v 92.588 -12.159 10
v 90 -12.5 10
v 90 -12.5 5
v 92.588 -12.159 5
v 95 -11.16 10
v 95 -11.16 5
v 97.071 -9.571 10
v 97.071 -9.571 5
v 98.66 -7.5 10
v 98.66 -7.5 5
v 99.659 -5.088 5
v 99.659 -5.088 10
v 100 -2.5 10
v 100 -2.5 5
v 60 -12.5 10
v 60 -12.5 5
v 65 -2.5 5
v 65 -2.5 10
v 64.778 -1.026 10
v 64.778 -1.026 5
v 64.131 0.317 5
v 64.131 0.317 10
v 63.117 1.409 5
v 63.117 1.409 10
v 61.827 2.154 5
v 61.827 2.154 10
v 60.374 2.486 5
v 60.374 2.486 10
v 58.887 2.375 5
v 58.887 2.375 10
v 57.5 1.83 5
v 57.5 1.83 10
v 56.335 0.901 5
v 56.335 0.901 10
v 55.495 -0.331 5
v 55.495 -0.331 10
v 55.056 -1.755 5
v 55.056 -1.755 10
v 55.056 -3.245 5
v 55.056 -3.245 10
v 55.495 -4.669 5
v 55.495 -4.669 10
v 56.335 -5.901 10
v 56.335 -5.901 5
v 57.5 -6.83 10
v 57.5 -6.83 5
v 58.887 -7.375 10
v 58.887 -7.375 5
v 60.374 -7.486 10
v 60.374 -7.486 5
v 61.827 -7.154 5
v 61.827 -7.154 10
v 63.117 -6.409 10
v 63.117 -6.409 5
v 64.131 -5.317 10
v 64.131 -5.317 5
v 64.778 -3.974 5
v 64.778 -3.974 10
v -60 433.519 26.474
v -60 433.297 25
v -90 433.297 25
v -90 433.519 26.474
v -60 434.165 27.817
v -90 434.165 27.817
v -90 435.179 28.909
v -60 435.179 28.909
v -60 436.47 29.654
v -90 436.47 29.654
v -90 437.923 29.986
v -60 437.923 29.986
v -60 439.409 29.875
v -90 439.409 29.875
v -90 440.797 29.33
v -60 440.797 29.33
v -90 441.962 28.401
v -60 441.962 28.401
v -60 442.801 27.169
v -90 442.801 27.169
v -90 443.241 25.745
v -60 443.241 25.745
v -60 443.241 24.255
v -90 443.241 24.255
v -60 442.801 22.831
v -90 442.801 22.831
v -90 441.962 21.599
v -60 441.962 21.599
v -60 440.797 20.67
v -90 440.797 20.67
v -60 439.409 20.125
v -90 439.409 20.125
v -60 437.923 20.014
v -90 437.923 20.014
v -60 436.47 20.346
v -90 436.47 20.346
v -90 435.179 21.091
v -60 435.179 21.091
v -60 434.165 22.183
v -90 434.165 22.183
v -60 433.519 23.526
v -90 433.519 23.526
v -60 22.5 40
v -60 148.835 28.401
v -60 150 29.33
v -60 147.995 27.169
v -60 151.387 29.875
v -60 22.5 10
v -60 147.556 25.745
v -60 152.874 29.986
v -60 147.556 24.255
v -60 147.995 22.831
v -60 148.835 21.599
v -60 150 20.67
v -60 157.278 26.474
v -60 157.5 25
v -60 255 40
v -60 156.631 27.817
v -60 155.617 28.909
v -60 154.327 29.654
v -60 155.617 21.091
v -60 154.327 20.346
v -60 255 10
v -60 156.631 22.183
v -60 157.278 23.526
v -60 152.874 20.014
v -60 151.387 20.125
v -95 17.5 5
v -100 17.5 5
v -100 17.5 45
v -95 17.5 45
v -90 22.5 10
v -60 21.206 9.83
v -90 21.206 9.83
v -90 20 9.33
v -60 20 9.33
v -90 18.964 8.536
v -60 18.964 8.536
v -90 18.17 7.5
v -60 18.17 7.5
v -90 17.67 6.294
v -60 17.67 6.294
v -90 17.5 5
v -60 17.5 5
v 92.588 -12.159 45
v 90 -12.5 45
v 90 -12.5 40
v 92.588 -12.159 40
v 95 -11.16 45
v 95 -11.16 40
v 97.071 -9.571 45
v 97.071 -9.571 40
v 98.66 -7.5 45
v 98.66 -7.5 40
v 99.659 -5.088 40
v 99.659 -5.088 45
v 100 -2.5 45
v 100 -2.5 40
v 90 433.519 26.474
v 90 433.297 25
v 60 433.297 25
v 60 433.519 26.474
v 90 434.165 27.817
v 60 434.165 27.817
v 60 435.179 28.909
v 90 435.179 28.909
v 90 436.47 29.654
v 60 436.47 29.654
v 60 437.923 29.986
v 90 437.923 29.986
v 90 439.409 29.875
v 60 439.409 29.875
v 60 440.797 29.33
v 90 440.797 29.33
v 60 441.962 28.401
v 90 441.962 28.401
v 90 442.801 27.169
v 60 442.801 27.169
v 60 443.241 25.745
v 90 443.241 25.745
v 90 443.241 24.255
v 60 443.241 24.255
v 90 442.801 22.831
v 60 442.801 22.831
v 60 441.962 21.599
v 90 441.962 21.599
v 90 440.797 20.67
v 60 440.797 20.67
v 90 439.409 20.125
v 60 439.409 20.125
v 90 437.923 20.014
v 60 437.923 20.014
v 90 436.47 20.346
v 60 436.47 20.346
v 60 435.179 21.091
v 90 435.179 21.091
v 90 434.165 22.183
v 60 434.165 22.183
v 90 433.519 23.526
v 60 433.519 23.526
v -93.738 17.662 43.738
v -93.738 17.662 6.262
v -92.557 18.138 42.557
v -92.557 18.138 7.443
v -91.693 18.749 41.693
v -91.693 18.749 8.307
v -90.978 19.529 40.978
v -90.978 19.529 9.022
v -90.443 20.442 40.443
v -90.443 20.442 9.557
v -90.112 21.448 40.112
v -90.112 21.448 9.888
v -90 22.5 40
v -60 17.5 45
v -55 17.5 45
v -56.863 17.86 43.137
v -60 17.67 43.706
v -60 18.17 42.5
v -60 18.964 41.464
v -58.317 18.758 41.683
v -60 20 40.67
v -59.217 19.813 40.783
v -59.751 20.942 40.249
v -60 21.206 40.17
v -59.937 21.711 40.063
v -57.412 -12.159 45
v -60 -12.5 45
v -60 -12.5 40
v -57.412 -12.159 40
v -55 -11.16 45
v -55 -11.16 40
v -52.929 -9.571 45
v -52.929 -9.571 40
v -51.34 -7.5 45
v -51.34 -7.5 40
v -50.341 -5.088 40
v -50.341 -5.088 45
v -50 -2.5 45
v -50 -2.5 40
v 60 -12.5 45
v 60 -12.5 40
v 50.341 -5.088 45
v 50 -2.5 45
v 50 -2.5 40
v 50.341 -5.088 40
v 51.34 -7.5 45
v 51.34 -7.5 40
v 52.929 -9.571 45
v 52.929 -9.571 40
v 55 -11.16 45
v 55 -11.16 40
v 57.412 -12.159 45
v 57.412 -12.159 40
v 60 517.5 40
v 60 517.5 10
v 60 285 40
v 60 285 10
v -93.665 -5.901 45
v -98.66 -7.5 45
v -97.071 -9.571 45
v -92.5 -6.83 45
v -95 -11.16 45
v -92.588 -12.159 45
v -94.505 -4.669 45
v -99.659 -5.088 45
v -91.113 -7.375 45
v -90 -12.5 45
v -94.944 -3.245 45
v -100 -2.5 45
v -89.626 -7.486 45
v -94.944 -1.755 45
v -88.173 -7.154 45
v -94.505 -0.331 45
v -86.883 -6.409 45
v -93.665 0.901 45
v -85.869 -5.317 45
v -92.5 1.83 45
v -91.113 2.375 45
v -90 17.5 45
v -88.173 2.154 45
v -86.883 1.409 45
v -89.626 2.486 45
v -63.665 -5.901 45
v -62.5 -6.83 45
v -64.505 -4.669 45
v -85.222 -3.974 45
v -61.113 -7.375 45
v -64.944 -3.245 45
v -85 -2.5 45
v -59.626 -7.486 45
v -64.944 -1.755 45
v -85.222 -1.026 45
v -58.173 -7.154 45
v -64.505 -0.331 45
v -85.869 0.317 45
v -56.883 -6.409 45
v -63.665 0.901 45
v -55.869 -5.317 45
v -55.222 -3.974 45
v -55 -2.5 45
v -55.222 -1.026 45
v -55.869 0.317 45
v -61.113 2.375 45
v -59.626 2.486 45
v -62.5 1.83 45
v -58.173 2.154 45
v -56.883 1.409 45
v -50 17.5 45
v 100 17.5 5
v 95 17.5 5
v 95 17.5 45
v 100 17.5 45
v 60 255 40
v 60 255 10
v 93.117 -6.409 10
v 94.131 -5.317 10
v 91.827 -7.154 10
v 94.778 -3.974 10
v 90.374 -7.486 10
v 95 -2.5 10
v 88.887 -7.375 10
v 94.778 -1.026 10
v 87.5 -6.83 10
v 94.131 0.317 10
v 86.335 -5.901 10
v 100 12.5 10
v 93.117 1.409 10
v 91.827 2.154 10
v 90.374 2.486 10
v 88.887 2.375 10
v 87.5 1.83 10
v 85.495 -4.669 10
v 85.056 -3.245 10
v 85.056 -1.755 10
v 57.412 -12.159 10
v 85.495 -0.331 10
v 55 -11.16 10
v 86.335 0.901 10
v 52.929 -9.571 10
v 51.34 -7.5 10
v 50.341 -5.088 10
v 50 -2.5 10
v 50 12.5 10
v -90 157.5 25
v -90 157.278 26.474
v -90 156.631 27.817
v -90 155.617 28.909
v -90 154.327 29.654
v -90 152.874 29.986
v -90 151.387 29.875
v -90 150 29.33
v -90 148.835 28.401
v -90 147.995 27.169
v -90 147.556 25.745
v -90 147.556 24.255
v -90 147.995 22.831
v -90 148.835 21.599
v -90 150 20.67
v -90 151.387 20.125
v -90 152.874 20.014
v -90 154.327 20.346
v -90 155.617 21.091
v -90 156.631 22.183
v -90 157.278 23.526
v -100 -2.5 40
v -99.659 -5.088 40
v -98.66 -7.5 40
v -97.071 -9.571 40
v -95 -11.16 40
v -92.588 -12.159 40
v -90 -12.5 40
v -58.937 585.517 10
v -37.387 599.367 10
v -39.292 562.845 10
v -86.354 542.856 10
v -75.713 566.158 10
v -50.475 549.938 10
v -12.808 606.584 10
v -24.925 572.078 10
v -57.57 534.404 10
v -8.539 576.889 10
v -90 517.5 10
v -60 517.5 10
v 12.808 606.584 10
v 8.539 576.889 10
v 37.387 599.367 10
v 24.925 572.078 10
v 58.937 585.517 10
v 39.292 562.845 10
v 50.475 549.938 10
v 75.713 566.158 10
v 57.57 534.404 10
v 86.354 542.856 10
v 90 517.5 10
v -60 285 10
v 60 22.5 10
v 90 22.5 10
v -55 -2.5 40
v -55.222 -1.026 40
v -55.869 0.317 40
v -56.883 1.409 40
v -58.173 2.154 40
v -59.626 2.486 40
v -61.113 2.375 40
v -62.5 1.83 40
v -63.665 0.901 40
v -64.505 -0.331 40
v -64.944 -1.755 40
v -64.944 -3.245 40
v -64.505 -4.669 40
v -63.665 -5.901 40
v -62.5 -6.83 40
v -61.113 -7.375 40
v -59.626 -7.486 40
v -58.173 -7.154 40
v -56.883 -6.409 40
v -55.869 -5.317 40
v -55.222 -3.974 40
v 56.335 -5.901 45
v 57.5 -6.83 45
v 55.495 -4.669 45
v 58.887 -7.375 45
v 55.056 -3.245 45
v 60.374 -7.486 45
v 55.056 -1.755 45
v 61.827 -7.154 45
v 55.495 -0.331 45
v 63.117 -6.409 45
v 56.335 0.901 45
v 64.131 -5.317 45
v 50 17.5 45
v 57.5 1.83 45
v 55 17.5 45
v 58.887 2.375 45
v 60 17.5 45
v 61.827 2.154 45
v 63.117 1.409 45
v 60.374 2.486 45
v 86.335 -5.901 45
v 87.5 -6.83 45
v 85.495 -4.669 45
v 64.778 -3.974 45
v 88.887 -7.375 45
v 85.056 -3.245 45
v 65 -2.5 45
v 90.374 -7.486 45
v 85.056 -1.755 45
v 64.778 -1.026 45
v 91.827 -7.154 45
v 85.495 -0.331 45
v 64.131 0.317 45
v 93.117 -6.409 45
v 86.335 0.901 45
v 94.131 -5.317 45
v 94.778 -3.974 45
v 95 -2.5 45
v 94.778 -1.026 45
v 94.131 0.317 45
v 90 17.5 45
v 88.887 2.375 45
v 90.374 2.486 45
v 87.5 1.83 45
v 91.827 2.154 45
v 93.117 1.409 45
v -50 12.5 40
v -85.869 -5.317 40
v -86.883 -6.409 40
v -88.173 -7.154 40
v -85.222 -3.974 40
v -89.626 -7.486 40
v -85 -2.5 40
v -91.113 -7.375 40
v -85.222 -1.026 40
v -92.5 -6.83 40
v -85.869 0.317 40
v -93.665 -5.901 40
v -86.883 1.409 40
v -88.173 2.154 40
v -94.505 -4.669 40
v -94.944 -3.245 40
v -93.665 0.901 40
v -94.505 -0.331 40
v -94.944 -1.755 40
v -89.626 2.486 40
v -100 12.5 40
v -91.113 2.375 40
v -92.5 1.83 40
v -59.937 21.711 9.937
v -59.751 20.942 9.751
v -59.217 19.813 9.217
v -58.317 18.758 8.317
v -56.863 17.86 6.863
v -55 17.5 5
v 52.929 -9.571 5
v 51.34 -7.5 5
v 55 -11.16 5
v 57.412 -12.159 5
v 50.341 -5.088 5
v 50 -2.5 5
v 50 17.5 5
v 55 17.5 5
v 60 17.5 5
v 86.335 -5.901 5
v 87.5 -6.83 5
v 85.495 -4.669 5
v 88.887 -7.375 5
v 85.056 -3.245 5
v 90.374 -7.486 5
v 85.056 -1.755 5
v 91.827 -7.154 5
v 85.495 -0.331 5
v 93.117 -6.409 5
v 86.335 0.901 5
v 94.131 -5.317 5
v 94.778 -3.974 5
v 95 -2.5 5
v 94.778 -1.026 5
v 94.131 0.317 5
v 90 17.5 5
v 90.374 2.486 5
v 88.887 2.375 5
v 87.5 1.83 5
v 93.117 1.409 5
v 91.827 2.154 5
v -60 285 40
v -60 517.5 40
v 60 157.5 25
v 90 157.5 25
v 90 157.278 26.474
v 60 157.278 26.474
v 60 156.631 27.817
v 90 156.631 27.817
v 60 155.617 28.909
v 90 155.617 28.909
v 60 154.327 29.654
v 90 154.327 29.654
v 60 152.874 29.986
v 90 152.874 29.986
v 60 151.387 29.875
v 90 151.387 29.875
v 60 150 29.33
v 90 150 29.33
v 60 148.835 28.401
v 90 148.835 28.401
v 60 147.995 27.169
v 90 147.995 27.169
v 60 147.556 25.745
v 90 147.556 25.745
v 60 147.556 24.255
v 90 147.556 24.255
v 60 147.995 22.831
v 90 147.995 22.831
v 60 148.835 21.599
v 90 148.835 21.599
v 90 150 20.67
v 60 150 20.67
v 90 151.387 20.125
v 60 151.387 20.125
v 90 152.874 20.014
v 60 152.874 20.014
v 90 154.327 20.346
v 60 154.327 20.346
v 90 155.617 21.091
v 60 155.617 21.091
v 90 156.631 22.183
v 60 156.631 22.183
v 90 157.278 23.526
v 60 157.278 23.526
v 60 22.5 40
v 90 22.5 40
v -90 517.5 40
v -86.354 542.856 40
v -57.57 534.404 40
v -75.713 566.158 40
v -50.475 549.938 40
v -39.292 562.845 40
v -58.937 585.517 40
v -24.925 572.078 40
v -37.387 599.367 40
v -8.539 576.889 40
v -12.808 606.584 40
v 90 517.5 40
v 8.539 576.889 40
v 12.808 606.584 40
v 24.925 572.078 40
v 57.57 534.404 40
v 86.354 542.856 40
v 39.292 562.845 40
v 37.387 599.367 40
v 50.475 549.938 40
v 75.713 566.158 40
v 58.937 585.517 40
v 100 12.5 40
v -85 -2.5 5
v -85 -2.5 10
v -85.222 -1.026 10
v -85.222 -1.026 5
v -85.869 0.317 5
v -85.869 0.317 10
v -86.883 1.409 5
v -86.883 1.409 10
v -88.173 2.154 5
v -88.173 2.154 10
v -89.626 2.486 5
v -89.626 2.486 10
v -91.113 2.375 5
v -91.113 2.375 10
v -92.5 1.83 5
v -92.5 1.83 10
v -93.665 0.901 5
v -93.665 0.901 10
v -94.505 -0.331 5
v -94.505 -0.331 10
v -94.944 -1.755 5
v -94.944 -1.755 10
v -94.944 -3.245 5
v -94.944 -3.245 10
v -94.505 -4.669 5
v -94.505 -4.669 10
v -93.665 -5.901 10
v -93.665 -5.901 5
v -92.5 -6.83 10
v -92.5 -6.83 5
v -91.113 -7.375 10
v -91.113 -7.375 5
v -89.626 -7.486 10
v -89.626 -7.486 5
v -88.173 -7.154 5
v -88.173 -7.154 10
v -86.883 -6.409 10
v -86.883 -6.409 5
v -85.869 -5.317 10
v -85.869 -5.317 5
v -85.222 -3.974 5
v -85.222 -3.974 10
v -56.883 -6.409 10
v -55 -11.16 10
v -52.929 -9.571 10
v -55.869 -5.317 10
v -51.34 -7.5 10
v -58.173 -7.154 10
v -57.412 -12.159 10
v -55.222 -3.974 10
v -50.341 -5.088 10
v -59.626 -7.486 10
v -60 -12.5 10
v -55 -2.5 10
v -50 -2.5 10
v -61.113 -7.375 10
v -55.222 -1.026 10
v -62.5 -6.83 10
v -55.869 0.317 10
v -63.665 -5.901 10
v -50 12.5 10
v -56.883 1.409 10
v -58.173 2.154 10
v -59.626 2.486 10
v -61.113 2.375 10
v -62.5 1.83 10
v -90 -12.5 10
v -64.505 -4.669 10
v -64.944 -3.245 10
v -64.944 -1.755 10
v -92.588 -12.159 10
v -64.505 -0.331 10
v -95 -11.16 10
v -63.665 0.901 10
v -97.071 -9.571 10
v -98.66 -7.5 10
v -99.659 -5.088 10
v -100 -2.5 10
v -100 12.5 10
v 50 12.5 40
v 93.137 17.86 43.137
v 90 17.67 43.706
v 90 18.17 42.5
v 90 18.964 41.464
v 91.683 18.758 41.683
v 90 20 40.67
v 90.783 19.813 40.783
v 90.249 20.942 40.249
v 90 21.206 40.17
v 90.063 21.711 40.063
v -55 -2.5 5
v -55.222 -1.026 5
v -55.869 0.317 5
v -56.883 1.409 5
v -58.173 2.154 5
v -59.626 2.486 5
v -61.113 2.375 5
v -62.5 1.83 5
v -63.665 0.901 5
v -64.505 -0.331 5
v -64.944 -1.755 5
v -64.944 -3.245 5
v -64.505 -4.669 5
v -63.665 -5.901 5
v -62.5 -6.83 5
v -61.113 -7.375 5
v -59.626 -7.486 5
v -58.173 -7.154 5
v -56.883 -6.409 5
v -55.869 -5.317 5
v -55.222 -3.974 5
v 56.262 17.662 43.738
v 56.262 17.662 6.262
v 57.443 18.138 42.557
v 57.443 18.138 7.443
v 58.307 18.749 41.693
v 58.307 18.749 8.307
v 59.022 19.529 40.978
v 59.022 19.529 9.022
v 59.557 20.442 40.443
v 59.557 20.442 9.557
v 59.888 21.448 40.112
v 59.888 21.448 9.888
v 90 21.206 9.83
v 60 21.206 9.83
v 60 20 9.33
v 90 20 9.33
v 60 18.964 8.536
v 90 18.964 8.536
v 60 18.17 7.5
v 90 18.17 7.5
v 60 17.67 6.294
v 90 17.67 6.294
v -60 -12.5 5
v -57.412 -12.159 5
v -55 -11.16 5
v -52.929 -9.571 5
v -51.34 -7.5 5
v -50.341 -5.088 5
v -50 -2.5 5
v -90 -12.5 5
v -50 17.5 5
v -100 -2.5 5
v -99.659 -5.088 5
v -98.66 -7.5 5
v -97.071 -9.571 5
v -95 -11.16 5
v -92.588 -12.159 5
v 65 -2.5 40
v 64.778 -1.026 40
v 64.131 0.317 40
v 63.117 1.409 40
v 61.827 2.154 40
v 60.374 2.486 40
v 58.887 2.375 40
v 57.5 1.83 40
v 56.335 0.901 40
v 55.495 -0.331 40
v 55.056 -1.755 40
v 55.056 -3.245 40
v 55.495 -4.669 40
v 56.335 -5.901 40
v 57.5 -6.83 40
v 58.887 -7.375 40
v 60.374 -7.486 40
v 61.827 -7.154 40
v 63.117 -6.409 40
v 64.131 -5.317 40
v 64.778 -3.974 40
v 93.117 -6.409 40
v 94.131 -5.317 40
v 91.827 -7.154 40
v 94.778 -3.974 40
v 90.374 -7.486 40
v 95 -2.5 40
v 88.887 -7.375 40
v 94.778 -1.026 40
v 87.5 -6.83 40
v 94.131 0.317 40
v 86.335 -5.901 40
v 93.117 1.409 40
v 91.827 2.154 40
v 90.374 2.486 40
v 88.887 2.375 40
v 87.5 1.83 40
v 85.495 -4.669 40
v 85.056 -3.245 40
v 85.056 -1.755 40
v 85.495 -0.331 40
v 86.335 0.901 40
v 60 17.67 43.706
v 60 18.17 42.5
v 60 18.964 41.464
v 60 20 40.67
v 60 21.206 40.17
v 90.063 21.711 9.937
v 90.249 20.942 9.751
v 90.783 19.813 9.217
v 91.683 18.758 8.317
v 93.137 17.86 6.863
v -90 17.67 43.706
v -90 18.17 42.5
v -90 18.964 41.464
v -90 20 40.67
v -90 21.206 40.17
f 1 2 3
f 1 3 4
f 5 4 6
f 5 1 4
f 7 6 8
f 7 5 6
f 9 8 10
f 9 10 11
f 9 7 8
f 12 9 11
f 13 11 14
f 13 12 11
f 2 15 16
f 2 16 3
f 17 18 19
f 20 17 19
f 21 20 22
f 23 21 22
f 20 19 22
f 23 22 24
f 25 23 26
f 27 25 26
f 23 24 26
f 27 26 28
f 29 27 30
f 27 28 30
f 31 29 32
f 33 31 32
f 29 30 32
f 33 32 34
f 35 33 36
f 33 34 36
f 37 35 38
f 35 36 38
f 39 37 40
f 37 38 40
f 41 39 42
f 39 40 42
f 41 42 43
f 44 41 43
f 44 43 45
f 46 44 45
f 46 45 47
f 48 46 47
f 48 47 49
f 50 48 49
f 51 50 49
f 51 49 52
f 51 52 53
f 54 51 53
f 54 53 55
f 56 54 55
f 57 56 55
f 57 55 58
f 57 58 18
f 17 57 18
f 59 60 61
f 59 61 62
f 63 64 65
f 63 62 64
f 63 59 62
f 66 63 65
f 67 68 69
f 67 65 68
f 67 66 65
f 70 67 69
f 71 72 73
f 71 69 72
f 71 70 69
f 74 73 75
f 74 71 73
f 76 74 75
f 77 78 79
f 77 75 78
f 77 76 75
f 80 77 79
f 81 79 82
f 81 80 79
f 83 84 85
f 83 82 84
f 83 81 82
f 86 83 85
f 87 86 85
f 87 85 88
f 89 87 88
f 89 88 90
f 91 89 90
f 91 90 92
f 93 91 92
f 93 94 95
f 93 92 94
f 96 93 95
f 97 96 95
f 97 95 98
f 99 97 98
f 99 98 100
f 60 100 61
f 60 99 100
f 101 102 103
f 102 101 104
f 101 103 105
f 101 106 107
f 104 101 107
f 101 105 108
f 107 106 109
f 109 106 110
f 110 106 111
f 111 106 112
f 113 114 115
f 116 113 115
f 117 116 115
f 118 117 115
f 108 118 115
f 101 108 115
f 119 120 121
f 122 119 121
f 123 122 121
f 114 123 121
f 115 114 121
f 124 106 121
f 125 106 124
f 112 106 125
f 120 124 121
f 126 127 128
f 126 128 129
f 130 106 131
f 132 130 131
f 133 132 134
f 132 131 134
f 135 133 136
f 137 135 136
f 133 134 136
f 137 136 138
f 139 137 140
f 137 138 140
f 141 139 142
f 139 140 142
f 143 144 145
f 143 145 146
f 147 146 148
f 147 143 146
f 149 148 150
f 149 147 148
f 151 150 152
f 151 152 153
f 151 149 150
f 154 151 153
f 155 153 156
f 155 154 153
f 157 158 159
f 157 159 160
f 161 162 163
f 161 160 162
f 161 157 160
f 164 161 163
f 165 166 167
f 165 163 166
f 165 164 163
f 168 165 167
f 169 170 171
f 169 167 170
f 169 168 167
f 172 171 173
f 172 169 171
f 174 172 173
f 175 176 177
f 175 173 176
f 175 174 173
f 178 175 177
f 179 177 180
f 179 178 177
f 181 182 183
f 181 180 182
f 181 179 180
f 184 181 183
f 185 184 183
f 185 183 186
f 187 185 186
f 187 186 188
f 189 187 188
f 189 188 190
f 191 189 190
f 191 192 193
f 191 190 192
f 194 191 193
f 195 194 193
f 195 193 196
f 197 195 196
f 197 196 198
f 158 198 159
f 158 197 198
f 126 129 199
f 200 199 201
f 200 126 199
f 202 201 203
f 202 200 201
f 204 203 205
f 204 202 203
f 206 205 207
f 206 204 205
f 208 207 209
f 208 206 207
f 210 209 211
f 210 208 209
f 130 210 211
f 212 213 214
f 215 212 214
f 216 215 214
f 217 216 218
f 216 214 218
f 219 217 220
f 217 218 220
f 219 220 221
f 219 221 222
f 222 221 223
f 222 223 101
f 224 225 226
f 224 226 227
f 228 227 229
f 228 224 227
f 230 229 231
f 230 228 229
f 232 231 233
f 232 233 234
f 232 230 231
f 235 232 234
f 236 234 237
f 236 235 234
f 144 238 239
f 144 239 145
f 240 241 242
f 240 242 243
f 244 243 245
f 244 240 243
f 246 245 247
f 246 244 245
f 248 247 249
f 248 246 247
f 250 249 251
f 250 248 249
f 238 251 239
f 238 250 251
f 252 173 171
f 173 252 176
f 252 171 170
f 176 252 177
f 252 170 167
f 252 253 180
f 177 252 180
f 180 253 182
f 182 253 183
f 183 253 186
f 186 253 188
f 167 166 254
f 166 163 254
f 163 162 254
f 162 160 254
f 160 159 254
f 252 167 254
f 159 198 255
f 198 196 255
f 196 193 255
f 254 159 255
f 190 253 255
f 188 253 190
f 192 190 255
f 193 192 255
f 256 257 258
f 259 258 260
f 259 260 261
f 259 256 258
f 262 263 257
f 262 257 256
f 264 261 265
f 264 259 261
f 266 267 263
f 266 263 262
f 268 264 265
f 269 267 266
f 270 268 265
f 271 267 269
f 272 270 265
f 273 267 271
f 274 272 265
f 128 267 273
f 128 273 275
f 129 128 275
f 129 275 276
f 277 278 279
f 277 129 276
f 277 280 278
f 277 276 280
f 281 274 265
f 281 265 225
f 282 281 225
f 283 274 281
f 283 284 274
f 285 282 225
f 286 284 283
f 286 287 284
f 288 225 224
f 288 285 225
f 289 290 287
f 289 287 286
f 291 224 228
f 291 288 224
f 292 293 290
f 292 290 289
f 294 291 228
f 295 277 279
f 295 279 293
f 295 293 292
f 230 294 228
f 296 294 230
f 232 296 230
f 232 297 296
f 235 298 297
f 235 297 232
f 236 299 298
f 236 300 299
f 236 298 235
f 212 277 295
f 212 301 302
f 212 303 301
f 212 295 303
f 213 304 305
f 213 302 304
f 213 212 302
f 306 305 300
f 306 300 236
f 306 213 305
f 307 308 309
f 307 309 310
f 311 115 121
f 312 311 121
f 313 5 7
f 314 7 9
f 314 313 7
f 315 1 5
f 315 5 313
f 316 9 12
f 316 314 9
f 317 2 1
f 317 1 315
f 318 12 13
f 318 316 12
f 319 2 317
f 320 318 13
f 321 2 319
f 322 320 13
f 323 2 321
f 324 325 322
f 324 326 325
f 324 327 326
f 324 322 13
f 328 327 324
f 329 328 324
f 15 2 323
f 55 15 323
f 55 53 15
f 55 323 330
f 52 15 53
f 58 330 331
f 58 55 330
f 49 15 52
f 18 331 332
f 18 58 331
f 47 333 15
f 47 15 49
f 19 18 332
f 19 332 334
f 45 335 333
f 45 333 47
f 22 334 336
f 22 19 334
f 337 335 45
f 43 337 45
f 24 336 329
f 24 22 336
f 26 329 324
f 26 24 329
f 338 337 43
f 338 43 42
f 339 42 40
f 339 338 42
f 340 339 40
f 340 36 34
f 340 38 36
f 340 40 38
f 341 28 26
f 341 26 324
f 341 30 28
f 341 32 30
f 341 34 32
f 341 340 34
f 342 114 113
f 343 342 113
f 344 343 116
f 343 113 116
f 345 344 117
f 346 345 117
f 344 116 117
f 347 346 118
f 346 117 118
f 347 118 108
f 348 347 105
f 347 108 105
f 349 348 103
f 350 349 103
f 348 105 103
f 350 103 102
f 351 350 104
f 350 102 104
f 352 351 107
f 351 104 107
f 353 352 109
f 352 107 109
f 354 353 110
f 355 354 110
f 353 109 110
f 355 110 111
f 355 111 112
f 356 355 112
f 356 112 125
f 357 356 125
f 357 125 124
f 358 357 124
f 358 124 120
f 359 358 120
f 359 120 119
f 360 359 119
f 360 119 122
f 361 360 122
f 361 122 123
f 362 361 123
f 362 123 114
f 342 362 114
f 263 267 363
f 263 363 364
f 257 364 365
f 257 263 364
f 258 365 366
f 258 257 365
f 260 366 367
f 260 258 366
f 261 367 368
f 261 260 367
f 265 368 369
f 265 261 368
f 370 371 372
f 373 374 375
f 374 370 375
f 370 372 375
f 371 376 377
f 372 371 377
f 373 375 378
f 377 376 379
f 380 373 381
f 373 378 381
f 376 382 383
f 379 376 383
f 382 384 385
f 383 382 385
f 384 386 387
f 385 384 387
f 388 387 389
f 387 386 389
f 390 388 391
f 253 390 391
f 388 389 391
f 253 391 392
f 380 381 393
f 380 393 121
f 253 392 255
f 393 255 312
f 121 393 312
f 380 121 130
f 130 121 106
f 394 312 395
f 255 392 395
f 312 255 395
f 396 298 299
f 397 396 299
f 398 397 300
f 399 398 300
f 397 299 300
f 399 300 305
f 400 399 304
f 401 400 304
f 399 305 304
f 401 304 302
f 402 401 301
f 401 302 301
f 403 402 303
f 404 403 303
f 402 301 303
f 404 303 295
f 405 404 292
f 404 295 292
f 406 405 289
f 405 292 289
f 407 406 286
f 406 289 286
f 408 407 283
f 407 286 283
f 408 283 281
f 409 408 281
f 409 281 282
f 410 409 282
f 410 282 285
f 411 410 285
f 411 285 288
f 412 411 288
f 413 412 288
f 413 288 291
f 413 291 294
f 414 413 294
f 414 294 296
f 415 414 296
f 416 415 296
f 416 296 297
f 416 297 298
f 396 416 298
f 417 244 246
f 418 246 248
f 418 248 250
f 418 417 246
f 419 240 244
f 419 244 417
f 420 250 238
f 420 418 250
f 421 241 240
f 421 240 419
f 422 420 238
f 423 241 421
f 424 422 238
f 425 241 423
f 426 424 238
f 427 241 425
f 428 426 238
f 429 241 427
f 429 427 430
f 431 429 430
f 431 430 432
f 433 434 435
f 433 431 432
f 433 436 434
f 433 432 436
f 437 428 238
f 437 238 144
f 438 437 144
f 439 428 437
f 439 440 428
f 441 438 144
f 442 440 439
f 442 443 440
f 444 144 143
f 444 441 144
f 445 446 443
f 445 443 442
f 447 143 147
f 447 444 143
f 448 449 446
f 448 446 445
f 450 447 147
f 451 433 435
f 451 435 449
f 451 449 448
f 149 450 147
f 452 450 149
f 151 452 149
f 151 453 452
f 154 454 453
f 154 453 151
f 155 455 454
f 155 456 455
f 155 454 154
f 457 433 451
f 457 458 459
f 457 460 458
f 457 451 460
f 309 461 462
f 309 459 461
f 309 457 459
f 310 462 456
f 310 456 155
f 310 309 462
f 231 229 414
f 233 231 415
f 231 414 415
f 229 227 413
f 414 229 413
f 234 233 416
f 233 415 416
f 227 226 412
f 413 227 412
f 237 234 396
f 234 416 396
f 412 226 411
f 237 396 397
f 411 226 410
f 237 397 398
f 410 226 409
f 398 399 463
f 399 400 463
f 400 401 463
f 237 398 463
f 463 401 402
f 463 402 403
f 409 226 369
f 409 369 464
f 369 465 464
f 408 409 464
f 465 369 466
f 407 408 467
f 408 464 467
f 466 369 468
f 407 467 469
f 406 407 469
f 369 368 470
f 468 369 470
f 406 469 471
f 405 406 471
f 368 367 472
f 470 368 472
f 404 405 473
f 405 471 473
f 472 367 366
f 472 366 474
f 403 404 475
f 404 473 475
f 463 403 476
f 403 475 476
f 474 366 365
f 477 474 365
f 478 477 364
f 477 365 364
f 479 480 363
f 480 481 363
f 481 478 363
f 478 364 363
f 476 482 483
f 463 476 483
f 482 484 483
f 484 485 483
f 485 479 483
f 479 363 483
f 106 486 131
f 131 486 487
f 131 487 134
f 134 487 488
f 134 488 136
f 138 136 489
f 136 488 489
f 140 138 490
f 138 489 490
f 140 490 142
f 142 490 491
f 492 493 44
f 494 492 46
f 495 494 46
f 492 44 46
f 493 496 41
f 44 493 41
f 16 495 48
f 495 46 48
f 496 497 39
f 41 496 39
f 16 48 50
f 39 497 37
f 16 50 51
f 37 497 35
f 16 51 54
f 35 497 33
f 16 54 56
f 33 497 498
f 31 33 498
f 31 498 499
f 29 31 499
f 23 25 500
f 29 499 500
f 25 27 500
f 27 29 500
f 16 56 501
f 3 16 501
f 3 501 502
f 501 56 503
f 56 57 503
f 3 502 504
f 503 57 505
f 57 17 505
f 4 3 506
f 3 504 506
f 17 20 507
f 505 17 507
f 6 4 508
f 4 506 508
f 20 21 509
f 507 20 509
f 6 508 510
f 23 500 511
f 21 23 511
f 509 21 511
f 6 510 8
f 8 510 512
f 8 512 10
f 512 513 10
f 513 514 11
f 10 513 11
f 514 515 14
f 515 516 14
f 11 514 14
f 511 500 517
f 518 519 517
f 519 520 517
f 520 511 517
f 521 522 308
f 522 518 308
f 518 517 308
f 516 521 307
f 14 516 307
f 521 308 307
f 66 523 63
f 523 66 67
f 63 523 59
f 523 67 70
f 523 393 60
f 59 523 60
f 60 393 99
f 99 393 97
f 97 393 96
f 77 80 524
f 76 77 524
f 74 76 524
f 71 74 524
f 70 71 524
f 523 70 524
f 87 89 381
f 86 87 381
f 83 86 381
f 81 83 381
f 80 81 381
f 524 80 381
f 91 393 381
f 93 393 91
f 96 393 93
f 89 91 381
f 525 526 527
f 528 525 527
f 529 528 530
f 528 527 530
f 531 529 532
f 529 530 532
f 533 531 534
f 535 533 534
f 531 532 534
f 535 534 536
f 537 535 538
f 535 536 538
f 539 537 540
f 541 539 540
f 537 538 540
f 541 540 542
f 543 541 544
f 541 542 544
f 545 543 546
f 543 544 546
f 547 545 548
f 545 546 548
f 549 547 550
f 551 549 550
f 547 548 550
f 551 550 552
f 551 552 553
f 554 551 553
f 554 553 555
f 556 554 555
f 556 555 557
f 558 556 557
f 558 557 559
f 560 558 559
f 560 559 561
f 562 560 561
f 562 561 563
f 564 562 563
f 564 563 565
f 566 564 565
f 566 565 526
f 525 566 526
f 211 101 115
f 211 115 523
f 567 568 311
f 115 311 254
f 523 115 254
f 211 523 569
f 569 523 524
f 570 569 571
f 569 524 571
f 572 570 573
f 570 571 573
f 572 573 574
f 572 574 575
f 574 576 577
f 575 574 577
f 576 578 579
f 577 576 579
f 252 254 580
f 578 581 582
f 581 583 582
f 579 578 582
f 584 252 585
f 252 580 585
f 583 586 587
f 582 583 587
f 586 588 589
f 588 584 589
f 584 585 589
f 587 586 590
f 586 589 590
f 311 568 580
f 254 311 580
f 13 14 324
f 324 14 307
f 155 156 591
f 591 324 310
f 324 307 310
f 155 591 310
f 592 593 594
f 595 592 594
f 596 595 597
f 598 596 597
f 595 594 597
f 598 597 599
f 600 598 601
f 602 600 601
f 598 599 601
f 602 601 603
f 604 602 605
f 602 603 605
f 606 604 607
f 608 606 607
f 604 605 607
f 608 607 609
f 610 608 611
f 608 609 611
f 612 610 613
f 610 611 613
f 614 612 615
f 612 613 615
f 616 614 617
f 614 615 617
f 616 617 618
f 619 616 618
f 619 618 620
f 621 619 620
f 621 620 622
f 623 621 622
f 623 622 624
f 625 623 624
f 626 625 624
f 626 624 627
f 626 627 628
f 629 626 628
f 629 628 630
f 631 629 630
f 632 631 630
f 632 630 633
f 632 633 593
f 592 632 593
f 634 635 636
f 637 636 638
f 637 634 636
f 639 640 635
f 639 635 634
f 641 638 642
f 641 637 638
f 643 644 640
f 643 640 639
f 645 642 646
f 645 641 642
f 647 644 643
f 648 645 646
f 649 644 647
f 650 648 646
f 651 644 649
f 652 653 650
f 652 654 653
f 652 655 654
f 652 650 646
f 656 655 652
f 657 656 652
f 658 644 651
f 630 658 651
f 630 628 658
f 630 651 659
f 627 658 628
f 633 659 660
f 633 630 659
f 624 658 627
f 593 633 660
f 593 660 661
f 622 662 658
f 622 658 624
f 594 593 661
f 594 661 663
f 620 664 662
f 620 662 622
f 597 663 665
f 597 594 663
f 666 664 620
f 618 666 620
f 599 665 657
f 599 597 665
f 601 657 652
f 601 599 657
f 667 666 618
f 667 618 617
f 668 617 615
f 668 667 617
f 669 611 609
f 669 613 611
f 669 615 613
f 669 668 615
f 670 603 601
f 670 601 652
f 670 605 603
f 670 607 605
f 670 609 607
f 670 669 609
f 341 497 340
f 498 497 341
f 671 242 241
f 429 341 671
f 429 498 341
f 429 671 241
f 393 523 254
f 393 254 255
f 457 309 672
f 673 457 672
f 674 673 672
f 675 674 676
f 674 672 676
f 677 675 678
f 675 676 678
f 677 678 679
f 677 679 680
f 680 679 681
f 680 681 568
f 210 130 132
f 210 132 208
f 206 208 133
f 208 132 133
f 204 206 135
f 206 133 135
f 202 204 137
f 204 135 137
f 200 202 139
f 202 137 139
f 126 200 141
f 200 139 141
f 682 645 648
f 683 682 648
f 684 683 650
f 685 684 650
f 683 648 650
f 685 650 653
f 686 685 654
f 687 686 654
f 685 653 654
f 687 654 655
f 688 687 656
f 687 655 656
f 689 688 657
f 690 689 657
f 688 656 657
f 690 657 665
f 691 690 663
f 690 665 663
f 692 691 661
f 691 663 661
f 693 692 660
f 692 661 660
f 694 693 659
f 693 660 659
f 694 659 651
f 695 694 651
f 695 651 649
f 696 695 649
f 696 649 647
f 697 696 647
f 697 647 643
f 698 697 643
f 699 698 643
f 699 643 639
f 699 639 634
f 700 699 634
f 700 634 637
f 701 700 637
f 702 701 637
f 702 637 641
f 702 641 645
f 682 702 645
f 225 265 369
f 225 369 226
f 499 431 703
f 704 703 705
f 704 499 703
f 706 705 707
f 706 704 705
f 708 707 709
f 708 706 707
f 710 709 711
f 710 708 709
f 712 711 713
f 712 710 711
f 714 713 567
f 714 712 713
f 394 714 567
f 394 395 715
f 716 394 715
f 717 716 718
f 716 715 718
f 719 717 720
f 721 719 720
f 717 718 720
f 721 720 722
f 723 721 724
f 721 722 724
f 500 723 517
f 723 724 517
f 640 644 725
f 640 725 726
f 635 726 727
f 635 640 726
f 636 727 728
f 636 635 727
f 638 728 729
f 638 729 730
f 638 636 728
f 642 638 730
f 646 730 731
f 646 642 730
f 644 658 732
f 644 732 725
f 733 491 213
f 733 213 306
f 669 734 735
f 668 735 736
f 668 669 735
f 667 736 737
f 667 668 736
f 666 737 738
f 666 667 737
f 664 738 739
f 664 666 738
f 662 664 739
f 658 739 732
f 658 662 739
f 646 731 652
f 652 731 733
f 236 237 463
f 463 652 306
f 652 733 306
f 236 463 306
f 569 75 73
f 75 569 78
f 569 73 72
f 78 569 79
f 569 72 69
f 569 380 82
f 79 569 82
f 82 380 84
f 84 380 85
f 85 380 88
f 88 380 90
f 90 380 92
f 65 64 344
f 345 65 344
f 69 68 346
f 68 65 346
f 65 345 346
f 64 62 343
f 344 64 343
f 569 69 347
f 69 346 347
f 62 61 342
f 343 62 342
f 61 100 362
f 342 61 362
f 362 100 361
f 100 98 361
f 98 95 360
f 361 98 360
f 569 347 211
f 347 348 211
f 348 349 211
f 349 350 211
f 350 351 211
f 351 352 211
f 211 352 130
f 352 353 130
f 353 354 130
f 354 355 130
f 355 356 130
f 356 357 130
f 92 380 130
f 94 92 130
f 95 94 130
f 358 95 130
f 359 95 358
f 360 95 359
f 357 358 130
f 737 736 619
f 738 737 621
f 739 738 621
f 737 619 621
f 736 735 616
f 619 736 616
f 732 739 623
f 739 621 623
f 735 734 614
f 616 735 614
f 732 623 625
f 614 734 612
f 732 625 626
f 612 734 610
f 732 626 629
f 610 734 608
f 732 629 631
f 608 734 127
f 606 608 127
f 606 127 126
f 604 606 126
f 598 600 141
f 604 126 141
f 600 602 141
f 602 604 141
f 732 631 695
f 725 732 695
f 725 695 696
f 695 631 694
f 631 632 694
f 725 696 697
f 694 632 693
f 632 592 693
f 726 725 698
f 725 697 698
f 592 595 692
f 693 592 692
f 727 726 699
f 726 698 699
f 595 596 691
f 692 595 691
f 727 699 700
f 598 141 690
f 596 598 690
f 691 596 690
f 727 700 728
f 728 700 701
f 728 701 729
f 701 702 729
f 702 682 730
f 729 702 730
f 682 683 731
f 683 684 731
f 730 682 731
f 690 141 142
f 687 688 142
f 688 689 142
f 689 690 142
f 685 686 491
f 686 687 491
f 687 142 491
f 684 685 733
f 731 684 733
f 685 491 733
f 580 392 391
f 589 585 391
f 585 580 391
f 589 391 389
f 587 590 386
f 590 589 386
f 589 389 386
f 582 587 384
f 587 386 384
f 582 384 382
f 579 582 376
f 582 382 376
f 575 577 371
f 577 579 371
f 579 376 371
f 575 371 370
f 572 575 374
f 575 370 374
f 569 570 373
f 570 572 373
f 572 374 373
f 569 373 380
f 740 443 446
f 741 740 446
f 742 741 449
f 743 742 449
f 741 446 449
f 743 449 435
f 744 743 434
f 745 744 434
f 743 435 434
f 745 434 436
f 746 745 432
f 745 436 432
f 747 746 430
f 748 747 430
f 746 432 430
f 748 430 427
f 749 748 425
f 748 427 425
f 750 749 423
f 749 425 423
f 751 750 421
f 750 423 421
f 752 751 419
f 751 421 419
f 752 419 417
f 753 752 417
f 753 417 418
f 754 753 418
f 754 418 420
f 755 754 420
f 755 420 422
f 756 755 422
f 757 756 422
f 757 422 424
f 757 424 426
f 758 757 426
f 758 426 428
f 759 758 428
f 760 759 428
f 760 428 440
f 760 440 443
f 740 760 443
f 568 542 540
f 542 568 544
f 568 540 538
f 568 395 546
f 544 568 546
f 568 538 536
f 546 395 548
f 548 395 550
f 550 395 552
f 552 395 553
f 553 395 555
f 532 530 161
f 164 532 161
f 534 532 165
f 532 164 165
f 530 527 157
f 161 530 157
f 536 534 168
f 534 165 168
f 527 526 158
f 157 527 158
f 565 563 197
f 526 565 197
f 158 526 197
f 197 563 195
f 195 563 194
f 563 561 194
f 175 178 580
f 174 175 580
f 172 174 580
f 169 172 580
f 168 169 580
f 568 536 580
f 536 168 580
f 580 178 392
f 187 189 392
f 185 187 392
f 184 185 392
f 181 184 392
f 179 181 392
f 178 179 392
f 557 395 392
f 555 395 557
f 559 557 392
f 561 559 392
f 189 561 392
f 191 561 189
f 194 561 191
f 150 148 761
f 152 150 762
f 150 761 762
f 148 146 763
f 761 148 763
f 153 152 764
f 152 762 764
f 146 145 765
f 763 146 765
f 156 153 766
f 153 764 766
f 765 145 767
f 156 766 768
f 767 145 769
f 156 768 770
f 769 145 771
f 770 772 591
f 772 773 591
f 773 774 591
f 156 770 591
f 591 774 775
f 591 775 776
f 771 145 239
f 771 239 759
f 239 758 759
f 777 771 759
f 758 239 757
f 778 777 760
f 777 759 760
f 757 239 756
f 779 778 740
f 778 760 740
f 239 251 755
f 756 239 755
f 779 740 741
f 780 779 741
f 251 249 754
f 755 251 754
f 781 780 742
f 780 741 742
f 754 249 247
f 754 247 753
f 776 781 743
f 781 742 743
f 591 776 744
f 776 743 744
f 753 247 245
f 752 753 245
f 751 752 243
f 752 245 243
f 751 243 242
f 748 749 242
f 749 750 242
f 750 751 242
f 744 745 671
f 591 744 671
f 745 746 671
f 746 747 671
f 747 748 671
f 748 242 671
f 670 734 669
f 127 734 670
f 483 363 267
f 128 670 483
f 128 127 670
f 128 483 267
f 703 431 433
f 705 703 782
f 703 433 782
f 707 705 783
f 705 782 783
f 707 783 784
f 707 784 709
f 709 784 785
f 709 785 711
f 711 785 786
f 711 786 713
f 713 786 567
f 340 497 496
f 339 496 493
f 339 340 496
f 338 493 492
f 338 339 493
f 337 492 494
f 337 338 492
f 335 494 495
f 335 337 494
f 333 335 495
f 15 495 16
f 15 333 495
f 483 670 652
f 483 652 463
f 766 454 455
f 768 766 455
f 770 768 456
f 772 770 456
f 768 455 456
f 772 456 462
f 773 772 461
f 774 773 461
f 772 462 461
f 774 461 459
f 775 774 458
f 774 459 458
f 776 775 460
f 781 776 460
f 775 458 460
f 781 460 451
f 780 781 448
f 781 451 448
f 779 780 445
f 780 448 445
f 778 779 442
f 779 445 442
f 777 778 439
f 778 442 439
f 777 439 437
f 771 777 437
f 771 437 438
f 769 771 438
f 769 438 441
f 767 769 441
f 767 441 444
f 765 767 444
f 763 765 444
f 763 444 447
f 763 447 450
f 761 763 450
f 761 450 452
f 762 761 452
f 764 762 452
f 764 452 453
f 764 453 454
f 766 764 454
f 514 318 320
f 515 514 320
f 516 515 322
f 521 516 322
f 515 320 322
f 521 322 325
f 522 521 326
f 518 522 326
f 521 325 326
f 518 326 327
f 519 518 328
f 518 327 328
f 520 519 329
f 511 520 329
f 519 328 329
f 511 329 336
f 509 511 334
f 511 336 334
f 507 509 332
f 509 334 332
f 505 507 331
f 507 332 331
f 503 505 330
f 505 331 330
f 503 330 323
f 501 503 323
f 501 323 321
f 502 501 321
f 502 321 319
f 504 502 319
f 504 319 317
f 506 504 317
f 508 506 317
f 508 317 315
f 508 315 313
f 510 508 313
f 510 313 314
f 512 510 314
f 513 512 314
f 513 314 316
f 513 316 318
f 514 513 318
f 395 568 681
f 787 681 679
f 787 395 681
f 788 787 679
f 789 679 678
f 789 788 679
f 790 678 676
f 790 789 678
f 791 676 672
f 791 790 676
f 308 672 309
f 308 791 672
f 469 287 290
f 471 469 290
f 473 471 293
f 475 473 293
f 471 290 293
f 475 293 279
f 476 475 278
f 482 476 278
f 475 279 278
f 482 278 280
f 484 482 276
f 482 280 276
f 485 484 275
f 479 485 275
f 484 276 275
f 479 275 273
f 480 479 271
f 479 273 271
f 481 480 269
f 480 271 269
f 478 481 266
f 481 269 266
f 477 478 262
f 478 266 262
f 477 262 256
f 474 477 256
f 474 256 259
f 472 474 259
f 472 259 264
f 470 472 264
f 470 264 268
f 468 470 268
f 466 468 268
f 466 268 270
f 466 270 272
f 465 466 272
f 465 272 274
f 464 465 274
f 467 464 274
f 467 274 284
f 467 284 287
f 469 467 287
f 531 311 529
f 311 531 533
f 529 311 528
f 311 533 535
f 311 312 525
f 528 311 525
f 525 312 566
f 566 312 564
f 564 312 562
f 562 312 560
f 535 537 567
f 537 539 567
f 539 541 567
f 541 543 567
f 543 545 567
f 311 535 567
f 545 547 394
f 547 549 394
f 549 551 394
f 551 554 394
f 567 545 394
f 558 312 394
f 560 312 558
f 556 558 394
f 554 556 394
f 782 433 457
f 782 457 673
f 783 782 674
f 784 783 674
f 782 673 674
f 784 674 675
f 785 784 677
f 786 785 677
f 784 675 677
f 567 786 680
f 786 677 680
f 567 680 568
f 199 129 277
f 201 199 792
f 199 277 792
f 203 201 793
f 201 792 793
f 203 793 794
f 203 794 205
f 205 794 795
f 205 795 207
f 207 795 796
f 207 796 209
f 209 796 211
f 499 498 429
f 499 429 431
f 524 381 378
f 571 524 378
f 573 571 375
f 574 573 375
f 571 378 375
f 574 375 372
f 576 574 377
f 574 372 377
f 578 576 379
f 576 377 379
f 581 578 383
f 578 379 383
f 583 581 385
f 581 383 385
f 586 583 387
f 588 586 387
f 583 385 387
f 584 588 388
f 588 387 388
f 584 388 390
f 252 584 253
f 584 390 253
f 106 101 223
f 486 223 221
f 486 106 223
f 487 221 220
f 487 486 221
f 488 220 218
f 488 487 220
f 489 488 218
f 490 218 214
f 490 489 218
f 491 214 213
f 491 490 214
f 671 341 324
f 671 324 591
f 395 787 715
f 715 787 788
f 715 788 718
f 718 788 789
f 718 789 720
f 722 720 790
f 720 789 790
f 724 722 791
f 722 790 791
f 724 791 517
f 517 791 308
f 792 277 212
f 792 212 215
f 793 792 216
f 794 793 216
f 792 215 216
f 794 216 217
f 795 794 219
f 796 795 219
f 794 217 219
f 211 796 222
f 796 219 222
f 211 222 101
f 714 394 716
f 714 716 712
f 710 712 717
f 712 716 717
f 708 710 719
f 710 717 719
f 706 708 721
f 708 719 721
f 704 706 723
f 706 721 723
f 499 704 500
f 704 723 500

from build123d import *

# Parameters (mm, degrees)
SKETCH1_R               = 5
BOSS_EXTRUDE1_DEPTH     = 50
SKETCH2_W               = 30
SKETCH2_H               = 30
CUT_EXTRUDE1_DEPTH      = 639.479639456
SKETCH3_W               = 30
SKETCH3_H               = 30
SKETCH3_W_2             = 5
SKETCH3_H_2             = 35
CUT_EXTRUDE2_DEPTH      = 642.526499842
FILLET1_R               = 5
SKETCH4_R               = 5
CUT_EXTRUDE3_DEPTH      = 639.10755363
SKETCH5_W               = 30
SKETCH5_H               = 30
BOSS_EXTRUDE2_DEPTH     = 120
SKETCH6_W               = 41.881061045
SKETCH6_H               = 38.598384764
CUT_EXTRUDE4_DEPTH      = 642.156182221
SKETCH7_W               = 50
SKETCH7_H               = 40
BOSS_EXTRUDE3_DEPTH     = 30
SKETCH8_R               = 5
CUT_EXTRUDE5_DEPTH      = 617.973459721
FILLET2_R               = 10
SKETCH9_W               = 30
SKETCH9_H               = 25
CUT_EXTRUDE6_DEPTH      = 642.156182221
CUT_EXTRUDE7_DEPTH      = 639.10755363
CUT_EXTRUDE7_DEPTH_BACK = 639.10755363
SKETCH10_R              = 5


with BuildPart() as part:
    # Sketch1 → Boss-Extrude1 (new body)
    with BuildSketch(Plane.XY):
        with BuildLine():
            Line((90, 17.5), (90, 517.5))
            ThreePointArc((90, 517.5), (0, 607.5), (-90, 517.5))
            Line((-90, 517.5), (-90, 17.5))
            Line((-90, 17.5), (-100, 17.5))
            Line((-100, 17.5), (-100, -7.5))
            ThreePointArc((-100, -7.5), (-97.071067812, -14.571067812), (-90, -17.5))
            Line((-90, -17.5), (-60, -17.5))
            ThreePointArc((-60, -17.5), (-52.928932188, -14.571067812), (-50, -7.5))
            Line((-50, -7.5), (-50, 17.5))
            Line((-50, 17.5), (-60, 17.5))
            Line((-60, 17.5), (-60, 517.5))
            ThreePointArc((-60, 517.5), (0, 577.5), (60, 517.5))
            Line((60, 517.5), (60, 17.5))
            Line((60, 17.5), (50, 17.5))
            Line((50, 17.5), (50, -7.5))
            ThreePointArc((50, -7.5), (52.928932188, -14.571067812), (60, -17.5))
            Line((60, -17.5), (90, -17.5))
            ThreePointArc((90, -17.5), (97.071067812, -14.571067812), (100, -7.5))
            Line((100, -7.5), (100, 17.5))
            Line((100, 17.5), (90, 17.5))
        make_face()
        with Locations((90, -7.5)):
            Circle(SKETCH1_R, mode=Mode.SUBTRACT)
        with Locations((60, -7.5)):
            Circle(SKETCH1_R, mode=Mode.SUBTRACT)
        with Locations((-90, -7.5)):
            Circle(SKETCH1_R, mode=Mode.SUBTRACT)
        with Locations((-60, -7.5)):
            Circle(SKETCH1_R, mode=Mode.SUBTRACT)
    extrude(amount=BOSS_EXTRUDE1_DEPTH)

    # Sketch2 → Cut-Extrude1 (cut, through all)
    with BuildSketch(Plane(origin=(90, 0, 0), x_dir=(0, 0, -1), z_dir=(1, 0, 0))):
        with BuildLine():
            Line((-50, 17.5), (-45, 17.5))
            ThreePointArc((-45, 17.5), (-41.464466094, 18.964466094), (-40, 22.5))
            Line((-40, 22.5), (-40, 607.5))
            Line((-40, 607.5), (-50, 607.5))
            Line((-50, 607.5), (-50, 17.5))
        make_face()
        with Locations((-25, -2.5)):
            Rectangle(SKETCH2_W, SKETCH2_H)
        with BuildLine():
            Line((-5, 17.5), (0, 17.5))
            Line((0, 17.5), (0, 607.5))
            Line((0, 607.5), (-10, 607.5))
            Line((-10, 607.5), (-10, 22.5))
            ThreePointArc((-10, 22.5), (-8.535533906, 18.964466094), (-5, 17.5))
        make_face()
    extrude(amount=-CUT_EXTRUDE1_DEPTH, mode=Mode.SUBTRACT)

    # Sketch3 → Cut-Extrude2 (cut, through all)
    with BuildSketch(Plane(origin=(100, 0, 0), x_dir=(0, 0, -1), z_dir=(1, 0, 0))):
        with Locations((-25, -2.5)):
            Rectangle(SKETCH3_W, SKETCH3_H)
        with Locations((-47.5, 0)):
            Rectangle(SKETCH3_W_2, SKETCH3_H_2)
        with Locations((-2.5, 0)):
            Rectangle(SKETCH3_W_2, SKETCH3_H_2)
    extrude(amount=-CUT_EXTRUDE2_DEPTH, mode=Mode.SUBTRACT)

    # Fillet1
    # the kernel refuses this fillet: 5 mm, written as the material it adds along each edge
    with BuildSketch(Plane(origin=(-90, 17.5, 5), x_dir=(-1, 0, 0), z_dir=(0, 0, 1))) as fillet1_piece_1_section:
        with BuildLine():
            CenterArc((FILLET1_R, -FILLET1_R), FILLET1_R, 90, 90)
            Line((0, -FILLET1_R), (0, 0))
            Line((0, 0), (FILLET1_R, 0))
        make_face()
    fillet1_piece_1 = extrude(amount=40, mode=Mode.PRIVATE)
    fillet1_piece_1 = fillet1_piece_1 - Plane(origin=(-91.427889151, 22.5, 45), x_dir=(0, -1, 0), z_dir=(1, 0, 0)) * Cylinder(5, 101, mode=Mode.PRIVATE)
    fillet1_piece_1 = fillet1_piece_1 - Plane(origin=(-91.427889151, 22.5, 5), x_dir=(0, 0, 1), z_dir=(1, 0, 0)) * Cylinder(5, 101, mode=Mode.PRIVATE)
    add(fillet1_piece_1)
    with BuildSketch(Plane(origin=(60, 17.5, 5), x_dir=(-1, 0, 0), z_dir=(0, 0, 1))) as fillet1_piece_2_section:
        with BuildLine():
            CenterArc((FILLET1_R, -FILLET1_R), FILLET1_R, 90, 90)
            Line((0, -FILLET1_R), (0, 0))
            Line((0, 0), (FILLET1_R, 0))
        make_face()
    fillet1_piece_2 = extrude(amount=40, mode=Mode.PRIVATE)
    fillet1_piece_2 = fillet1_piece_2 - Plane(origin=(58.572110849, 22.5, 5), x_dir=(0, 0, 1), z_dir=(1, 0, 0)) * Cylinder(5, 101, mode=Mode.PRIVATE)
    fillet1_piece_2 = fillet1_piece_2 - Plane(origin=(58.572110849, 22.5, 45), x_dir=(0, -1, 0), z_dir=(1, 0, 0)) * Cylinder(5, 101, mode=Mode.PRIVATE)
    add(fillet1_piece_2)
    with BuildSketch(Plane(origin=(-60, 17.5, 5), x_dir=(1, 0, 0), z_dir=(0, 0, 1))) as fillet1_piece_3_section:
        with BuildLine():
            CenterArc((FILLET1_R, FILLET1_R), FILLET1_R, 180, 90)
            Line((0, FILLET1_R), (0, 0))
            Line((0, 0), (FILLET1_R, 0))
        make_face()
    fillet1_piece_3 = extrude(amount=40, mode=Mode.PRIVATE)
    fillet1_piece_3 = fillet1_piece_3 - Plane(origin=(-58.572110849, 22.5, 45), x_dir=(0, -1, 0), z_dir=(1, 0, 0)) * Cylinder(5, 101, mode=Mode.PRIVATE)
    fillet1_piece_3 = fillet1_piece_3 - Plane(origin=(-58.572110849, 22.5, 5), x_dir=(0, 0, 1), z_dir=(1, 0, 0)) * Cylinder(5, 101, mode=Mode.PRIVATE)
    add(fillet1_piece_3)
    with BuildSketch(Plane(origin=(90, 17.5, 5), x_dir=(0, 1, 0), z_dir=(0, 0, 1))) as fillet1_piece_4_section:
        with BuildLine():
            CenterArc((FILLET1_R, -FILLET1_R), FILLET1_R, 90, 90)
            Line((0, -FILLET1_R), (0, 0))
            Line((0, 0), (FILLET1_R, 0))
        make_face()
    fillet1_piece_4 = extrude(amount=40, mode=Mode.PRIVATE)
    fillet1_piece_4 = fillet1_piece_4 - Plane(origin=(91.427889151, 22.5, 5), x_dir=(0, 0, 1), z_dir=(1, 0, 0)) * Cylinder(5, 101, mode=Mode.PRIVATE)
    fillet1_piece_4 = fillet1_piece_4 - Plane(origin=(91.427889151, 22.5, 45), x_dir=(0, -1, 0), z_dir=(1, 0, 0)) * Cylinder(5, 101, mode=Mode.PRIVATE)
    add(fillet1_piece_4)

    # Sketch4 → Cut-Extrude3 (cut, through all)
    with BuildSketch(Plane(origin=(90, 0, 0), x_dir=(0, 0, -1), z_dir=(1, 0, 0))):
        with Locations(Location((-25, 152.5, 0), (0, 0, 90))):
            Circle(SKETCH4_R)
    extrude(amount=-CUT_EXTRUDE3_DEPTH, mode=Mode.SUBTRACT)

    # Sketch5 → Boss-Extrude2 (add)
    with BuildSketch(Plane(origin=(-60, 0, 0), x_dir=(0, 0, -1), z_dir=(1, 0, 0))):
        with Locations((-25, 270)):
            Rectangle(SKETCH5_W, SKETCH5_H)
    extrude(amount=BOSS_EXTRUDE2_DEPTH)

    # Sketch6 → Cut-Extrude4 (cut, through all)
    with BuildSketch(Plane(origin=(100, 0, 0), x_dir=(0, 0, -1), z_dir=(1, 0, 0))):
        with Locations((-24.059469477, -1.799192382)):
            Rectangle(SKETCH6_W, SKETCH6_H)
    extrude(amount=-CUT_EXTRUDE4_DEPTH, mode=Mode.SUBTRACT)

    # Sketch7 → Boss-Extrude3 (add)
    with BuildSketch(Plane.XZ.offset(-17.5)):
        with Locations((-75, 25)):
            Rectangle(SKETCH7_W, SKETCH7_H)
        with Locations((75, 25)):
            Rectangle(SKETCH7_W, SKETCH7_H)
    extrude(amount=BOSS_EXTRUDE3_DEPTH)

    # Sketch8 → Cut-Extrude5 (cut, through all)
    with BuildSketch(Plane.XY.offset(45)):
        with Locations((-90, -2.5)):
            Circle(SKETCH8_R)
        with Locations((-60, -2.5)):
            Circle(SKETCH8_R)
        with Locations((60, -2.5)):
            Circle(SKETCH8_R)
        with Locations((90, -2.5)):
            Circle(SKETCH8_R)
    extrude(amount=-CUT_EXTRUDE5_DEPTH, mode=Mode.SUBTRACT)

    # Fillet2
    fillet2_edges = [part.edges().sort_by_distance(p)[0] for p in [
        (-100, -12.5, 25),
        (-50, -12.5, 25),
        (50, -12.5, 25),
        (100, -12.5, 25),
    ]]
    fillet(fillet2_edges, radius=FILLET2_R)

    # Sketch9 → Cut-Extrude6 (cut, through all)
    with BuildSketch(Plane.ZY.offset(100)):
        with Locations((25, 0)):
            Rectangle(SKETCH9_W, SKETCH9_H)
    extrude(amount=-CUT_EXTRUDE6_DEPTH, mode=Mode.SUBTRACT)

    # Sketch10 → Cut-Extrude7 (cut, two sides: drawn at the far end of the back side and taken through both)
    with BuildSketch(Plane.ZY.offset(90).offset(-CUT_EXTRUDE7_DEPTH_BACK)):
        with Locations(Location((25, 438.296527551, 0), (0, 0, 270))):
            Circle(SKETCH10_R)
    extrude(amount=CUT_EXTRUDE7_DEPTH + CUT_EXTRUDE7_DEPTH_BACK, mode=Mode.SUBTRACT)


solid = part.part
